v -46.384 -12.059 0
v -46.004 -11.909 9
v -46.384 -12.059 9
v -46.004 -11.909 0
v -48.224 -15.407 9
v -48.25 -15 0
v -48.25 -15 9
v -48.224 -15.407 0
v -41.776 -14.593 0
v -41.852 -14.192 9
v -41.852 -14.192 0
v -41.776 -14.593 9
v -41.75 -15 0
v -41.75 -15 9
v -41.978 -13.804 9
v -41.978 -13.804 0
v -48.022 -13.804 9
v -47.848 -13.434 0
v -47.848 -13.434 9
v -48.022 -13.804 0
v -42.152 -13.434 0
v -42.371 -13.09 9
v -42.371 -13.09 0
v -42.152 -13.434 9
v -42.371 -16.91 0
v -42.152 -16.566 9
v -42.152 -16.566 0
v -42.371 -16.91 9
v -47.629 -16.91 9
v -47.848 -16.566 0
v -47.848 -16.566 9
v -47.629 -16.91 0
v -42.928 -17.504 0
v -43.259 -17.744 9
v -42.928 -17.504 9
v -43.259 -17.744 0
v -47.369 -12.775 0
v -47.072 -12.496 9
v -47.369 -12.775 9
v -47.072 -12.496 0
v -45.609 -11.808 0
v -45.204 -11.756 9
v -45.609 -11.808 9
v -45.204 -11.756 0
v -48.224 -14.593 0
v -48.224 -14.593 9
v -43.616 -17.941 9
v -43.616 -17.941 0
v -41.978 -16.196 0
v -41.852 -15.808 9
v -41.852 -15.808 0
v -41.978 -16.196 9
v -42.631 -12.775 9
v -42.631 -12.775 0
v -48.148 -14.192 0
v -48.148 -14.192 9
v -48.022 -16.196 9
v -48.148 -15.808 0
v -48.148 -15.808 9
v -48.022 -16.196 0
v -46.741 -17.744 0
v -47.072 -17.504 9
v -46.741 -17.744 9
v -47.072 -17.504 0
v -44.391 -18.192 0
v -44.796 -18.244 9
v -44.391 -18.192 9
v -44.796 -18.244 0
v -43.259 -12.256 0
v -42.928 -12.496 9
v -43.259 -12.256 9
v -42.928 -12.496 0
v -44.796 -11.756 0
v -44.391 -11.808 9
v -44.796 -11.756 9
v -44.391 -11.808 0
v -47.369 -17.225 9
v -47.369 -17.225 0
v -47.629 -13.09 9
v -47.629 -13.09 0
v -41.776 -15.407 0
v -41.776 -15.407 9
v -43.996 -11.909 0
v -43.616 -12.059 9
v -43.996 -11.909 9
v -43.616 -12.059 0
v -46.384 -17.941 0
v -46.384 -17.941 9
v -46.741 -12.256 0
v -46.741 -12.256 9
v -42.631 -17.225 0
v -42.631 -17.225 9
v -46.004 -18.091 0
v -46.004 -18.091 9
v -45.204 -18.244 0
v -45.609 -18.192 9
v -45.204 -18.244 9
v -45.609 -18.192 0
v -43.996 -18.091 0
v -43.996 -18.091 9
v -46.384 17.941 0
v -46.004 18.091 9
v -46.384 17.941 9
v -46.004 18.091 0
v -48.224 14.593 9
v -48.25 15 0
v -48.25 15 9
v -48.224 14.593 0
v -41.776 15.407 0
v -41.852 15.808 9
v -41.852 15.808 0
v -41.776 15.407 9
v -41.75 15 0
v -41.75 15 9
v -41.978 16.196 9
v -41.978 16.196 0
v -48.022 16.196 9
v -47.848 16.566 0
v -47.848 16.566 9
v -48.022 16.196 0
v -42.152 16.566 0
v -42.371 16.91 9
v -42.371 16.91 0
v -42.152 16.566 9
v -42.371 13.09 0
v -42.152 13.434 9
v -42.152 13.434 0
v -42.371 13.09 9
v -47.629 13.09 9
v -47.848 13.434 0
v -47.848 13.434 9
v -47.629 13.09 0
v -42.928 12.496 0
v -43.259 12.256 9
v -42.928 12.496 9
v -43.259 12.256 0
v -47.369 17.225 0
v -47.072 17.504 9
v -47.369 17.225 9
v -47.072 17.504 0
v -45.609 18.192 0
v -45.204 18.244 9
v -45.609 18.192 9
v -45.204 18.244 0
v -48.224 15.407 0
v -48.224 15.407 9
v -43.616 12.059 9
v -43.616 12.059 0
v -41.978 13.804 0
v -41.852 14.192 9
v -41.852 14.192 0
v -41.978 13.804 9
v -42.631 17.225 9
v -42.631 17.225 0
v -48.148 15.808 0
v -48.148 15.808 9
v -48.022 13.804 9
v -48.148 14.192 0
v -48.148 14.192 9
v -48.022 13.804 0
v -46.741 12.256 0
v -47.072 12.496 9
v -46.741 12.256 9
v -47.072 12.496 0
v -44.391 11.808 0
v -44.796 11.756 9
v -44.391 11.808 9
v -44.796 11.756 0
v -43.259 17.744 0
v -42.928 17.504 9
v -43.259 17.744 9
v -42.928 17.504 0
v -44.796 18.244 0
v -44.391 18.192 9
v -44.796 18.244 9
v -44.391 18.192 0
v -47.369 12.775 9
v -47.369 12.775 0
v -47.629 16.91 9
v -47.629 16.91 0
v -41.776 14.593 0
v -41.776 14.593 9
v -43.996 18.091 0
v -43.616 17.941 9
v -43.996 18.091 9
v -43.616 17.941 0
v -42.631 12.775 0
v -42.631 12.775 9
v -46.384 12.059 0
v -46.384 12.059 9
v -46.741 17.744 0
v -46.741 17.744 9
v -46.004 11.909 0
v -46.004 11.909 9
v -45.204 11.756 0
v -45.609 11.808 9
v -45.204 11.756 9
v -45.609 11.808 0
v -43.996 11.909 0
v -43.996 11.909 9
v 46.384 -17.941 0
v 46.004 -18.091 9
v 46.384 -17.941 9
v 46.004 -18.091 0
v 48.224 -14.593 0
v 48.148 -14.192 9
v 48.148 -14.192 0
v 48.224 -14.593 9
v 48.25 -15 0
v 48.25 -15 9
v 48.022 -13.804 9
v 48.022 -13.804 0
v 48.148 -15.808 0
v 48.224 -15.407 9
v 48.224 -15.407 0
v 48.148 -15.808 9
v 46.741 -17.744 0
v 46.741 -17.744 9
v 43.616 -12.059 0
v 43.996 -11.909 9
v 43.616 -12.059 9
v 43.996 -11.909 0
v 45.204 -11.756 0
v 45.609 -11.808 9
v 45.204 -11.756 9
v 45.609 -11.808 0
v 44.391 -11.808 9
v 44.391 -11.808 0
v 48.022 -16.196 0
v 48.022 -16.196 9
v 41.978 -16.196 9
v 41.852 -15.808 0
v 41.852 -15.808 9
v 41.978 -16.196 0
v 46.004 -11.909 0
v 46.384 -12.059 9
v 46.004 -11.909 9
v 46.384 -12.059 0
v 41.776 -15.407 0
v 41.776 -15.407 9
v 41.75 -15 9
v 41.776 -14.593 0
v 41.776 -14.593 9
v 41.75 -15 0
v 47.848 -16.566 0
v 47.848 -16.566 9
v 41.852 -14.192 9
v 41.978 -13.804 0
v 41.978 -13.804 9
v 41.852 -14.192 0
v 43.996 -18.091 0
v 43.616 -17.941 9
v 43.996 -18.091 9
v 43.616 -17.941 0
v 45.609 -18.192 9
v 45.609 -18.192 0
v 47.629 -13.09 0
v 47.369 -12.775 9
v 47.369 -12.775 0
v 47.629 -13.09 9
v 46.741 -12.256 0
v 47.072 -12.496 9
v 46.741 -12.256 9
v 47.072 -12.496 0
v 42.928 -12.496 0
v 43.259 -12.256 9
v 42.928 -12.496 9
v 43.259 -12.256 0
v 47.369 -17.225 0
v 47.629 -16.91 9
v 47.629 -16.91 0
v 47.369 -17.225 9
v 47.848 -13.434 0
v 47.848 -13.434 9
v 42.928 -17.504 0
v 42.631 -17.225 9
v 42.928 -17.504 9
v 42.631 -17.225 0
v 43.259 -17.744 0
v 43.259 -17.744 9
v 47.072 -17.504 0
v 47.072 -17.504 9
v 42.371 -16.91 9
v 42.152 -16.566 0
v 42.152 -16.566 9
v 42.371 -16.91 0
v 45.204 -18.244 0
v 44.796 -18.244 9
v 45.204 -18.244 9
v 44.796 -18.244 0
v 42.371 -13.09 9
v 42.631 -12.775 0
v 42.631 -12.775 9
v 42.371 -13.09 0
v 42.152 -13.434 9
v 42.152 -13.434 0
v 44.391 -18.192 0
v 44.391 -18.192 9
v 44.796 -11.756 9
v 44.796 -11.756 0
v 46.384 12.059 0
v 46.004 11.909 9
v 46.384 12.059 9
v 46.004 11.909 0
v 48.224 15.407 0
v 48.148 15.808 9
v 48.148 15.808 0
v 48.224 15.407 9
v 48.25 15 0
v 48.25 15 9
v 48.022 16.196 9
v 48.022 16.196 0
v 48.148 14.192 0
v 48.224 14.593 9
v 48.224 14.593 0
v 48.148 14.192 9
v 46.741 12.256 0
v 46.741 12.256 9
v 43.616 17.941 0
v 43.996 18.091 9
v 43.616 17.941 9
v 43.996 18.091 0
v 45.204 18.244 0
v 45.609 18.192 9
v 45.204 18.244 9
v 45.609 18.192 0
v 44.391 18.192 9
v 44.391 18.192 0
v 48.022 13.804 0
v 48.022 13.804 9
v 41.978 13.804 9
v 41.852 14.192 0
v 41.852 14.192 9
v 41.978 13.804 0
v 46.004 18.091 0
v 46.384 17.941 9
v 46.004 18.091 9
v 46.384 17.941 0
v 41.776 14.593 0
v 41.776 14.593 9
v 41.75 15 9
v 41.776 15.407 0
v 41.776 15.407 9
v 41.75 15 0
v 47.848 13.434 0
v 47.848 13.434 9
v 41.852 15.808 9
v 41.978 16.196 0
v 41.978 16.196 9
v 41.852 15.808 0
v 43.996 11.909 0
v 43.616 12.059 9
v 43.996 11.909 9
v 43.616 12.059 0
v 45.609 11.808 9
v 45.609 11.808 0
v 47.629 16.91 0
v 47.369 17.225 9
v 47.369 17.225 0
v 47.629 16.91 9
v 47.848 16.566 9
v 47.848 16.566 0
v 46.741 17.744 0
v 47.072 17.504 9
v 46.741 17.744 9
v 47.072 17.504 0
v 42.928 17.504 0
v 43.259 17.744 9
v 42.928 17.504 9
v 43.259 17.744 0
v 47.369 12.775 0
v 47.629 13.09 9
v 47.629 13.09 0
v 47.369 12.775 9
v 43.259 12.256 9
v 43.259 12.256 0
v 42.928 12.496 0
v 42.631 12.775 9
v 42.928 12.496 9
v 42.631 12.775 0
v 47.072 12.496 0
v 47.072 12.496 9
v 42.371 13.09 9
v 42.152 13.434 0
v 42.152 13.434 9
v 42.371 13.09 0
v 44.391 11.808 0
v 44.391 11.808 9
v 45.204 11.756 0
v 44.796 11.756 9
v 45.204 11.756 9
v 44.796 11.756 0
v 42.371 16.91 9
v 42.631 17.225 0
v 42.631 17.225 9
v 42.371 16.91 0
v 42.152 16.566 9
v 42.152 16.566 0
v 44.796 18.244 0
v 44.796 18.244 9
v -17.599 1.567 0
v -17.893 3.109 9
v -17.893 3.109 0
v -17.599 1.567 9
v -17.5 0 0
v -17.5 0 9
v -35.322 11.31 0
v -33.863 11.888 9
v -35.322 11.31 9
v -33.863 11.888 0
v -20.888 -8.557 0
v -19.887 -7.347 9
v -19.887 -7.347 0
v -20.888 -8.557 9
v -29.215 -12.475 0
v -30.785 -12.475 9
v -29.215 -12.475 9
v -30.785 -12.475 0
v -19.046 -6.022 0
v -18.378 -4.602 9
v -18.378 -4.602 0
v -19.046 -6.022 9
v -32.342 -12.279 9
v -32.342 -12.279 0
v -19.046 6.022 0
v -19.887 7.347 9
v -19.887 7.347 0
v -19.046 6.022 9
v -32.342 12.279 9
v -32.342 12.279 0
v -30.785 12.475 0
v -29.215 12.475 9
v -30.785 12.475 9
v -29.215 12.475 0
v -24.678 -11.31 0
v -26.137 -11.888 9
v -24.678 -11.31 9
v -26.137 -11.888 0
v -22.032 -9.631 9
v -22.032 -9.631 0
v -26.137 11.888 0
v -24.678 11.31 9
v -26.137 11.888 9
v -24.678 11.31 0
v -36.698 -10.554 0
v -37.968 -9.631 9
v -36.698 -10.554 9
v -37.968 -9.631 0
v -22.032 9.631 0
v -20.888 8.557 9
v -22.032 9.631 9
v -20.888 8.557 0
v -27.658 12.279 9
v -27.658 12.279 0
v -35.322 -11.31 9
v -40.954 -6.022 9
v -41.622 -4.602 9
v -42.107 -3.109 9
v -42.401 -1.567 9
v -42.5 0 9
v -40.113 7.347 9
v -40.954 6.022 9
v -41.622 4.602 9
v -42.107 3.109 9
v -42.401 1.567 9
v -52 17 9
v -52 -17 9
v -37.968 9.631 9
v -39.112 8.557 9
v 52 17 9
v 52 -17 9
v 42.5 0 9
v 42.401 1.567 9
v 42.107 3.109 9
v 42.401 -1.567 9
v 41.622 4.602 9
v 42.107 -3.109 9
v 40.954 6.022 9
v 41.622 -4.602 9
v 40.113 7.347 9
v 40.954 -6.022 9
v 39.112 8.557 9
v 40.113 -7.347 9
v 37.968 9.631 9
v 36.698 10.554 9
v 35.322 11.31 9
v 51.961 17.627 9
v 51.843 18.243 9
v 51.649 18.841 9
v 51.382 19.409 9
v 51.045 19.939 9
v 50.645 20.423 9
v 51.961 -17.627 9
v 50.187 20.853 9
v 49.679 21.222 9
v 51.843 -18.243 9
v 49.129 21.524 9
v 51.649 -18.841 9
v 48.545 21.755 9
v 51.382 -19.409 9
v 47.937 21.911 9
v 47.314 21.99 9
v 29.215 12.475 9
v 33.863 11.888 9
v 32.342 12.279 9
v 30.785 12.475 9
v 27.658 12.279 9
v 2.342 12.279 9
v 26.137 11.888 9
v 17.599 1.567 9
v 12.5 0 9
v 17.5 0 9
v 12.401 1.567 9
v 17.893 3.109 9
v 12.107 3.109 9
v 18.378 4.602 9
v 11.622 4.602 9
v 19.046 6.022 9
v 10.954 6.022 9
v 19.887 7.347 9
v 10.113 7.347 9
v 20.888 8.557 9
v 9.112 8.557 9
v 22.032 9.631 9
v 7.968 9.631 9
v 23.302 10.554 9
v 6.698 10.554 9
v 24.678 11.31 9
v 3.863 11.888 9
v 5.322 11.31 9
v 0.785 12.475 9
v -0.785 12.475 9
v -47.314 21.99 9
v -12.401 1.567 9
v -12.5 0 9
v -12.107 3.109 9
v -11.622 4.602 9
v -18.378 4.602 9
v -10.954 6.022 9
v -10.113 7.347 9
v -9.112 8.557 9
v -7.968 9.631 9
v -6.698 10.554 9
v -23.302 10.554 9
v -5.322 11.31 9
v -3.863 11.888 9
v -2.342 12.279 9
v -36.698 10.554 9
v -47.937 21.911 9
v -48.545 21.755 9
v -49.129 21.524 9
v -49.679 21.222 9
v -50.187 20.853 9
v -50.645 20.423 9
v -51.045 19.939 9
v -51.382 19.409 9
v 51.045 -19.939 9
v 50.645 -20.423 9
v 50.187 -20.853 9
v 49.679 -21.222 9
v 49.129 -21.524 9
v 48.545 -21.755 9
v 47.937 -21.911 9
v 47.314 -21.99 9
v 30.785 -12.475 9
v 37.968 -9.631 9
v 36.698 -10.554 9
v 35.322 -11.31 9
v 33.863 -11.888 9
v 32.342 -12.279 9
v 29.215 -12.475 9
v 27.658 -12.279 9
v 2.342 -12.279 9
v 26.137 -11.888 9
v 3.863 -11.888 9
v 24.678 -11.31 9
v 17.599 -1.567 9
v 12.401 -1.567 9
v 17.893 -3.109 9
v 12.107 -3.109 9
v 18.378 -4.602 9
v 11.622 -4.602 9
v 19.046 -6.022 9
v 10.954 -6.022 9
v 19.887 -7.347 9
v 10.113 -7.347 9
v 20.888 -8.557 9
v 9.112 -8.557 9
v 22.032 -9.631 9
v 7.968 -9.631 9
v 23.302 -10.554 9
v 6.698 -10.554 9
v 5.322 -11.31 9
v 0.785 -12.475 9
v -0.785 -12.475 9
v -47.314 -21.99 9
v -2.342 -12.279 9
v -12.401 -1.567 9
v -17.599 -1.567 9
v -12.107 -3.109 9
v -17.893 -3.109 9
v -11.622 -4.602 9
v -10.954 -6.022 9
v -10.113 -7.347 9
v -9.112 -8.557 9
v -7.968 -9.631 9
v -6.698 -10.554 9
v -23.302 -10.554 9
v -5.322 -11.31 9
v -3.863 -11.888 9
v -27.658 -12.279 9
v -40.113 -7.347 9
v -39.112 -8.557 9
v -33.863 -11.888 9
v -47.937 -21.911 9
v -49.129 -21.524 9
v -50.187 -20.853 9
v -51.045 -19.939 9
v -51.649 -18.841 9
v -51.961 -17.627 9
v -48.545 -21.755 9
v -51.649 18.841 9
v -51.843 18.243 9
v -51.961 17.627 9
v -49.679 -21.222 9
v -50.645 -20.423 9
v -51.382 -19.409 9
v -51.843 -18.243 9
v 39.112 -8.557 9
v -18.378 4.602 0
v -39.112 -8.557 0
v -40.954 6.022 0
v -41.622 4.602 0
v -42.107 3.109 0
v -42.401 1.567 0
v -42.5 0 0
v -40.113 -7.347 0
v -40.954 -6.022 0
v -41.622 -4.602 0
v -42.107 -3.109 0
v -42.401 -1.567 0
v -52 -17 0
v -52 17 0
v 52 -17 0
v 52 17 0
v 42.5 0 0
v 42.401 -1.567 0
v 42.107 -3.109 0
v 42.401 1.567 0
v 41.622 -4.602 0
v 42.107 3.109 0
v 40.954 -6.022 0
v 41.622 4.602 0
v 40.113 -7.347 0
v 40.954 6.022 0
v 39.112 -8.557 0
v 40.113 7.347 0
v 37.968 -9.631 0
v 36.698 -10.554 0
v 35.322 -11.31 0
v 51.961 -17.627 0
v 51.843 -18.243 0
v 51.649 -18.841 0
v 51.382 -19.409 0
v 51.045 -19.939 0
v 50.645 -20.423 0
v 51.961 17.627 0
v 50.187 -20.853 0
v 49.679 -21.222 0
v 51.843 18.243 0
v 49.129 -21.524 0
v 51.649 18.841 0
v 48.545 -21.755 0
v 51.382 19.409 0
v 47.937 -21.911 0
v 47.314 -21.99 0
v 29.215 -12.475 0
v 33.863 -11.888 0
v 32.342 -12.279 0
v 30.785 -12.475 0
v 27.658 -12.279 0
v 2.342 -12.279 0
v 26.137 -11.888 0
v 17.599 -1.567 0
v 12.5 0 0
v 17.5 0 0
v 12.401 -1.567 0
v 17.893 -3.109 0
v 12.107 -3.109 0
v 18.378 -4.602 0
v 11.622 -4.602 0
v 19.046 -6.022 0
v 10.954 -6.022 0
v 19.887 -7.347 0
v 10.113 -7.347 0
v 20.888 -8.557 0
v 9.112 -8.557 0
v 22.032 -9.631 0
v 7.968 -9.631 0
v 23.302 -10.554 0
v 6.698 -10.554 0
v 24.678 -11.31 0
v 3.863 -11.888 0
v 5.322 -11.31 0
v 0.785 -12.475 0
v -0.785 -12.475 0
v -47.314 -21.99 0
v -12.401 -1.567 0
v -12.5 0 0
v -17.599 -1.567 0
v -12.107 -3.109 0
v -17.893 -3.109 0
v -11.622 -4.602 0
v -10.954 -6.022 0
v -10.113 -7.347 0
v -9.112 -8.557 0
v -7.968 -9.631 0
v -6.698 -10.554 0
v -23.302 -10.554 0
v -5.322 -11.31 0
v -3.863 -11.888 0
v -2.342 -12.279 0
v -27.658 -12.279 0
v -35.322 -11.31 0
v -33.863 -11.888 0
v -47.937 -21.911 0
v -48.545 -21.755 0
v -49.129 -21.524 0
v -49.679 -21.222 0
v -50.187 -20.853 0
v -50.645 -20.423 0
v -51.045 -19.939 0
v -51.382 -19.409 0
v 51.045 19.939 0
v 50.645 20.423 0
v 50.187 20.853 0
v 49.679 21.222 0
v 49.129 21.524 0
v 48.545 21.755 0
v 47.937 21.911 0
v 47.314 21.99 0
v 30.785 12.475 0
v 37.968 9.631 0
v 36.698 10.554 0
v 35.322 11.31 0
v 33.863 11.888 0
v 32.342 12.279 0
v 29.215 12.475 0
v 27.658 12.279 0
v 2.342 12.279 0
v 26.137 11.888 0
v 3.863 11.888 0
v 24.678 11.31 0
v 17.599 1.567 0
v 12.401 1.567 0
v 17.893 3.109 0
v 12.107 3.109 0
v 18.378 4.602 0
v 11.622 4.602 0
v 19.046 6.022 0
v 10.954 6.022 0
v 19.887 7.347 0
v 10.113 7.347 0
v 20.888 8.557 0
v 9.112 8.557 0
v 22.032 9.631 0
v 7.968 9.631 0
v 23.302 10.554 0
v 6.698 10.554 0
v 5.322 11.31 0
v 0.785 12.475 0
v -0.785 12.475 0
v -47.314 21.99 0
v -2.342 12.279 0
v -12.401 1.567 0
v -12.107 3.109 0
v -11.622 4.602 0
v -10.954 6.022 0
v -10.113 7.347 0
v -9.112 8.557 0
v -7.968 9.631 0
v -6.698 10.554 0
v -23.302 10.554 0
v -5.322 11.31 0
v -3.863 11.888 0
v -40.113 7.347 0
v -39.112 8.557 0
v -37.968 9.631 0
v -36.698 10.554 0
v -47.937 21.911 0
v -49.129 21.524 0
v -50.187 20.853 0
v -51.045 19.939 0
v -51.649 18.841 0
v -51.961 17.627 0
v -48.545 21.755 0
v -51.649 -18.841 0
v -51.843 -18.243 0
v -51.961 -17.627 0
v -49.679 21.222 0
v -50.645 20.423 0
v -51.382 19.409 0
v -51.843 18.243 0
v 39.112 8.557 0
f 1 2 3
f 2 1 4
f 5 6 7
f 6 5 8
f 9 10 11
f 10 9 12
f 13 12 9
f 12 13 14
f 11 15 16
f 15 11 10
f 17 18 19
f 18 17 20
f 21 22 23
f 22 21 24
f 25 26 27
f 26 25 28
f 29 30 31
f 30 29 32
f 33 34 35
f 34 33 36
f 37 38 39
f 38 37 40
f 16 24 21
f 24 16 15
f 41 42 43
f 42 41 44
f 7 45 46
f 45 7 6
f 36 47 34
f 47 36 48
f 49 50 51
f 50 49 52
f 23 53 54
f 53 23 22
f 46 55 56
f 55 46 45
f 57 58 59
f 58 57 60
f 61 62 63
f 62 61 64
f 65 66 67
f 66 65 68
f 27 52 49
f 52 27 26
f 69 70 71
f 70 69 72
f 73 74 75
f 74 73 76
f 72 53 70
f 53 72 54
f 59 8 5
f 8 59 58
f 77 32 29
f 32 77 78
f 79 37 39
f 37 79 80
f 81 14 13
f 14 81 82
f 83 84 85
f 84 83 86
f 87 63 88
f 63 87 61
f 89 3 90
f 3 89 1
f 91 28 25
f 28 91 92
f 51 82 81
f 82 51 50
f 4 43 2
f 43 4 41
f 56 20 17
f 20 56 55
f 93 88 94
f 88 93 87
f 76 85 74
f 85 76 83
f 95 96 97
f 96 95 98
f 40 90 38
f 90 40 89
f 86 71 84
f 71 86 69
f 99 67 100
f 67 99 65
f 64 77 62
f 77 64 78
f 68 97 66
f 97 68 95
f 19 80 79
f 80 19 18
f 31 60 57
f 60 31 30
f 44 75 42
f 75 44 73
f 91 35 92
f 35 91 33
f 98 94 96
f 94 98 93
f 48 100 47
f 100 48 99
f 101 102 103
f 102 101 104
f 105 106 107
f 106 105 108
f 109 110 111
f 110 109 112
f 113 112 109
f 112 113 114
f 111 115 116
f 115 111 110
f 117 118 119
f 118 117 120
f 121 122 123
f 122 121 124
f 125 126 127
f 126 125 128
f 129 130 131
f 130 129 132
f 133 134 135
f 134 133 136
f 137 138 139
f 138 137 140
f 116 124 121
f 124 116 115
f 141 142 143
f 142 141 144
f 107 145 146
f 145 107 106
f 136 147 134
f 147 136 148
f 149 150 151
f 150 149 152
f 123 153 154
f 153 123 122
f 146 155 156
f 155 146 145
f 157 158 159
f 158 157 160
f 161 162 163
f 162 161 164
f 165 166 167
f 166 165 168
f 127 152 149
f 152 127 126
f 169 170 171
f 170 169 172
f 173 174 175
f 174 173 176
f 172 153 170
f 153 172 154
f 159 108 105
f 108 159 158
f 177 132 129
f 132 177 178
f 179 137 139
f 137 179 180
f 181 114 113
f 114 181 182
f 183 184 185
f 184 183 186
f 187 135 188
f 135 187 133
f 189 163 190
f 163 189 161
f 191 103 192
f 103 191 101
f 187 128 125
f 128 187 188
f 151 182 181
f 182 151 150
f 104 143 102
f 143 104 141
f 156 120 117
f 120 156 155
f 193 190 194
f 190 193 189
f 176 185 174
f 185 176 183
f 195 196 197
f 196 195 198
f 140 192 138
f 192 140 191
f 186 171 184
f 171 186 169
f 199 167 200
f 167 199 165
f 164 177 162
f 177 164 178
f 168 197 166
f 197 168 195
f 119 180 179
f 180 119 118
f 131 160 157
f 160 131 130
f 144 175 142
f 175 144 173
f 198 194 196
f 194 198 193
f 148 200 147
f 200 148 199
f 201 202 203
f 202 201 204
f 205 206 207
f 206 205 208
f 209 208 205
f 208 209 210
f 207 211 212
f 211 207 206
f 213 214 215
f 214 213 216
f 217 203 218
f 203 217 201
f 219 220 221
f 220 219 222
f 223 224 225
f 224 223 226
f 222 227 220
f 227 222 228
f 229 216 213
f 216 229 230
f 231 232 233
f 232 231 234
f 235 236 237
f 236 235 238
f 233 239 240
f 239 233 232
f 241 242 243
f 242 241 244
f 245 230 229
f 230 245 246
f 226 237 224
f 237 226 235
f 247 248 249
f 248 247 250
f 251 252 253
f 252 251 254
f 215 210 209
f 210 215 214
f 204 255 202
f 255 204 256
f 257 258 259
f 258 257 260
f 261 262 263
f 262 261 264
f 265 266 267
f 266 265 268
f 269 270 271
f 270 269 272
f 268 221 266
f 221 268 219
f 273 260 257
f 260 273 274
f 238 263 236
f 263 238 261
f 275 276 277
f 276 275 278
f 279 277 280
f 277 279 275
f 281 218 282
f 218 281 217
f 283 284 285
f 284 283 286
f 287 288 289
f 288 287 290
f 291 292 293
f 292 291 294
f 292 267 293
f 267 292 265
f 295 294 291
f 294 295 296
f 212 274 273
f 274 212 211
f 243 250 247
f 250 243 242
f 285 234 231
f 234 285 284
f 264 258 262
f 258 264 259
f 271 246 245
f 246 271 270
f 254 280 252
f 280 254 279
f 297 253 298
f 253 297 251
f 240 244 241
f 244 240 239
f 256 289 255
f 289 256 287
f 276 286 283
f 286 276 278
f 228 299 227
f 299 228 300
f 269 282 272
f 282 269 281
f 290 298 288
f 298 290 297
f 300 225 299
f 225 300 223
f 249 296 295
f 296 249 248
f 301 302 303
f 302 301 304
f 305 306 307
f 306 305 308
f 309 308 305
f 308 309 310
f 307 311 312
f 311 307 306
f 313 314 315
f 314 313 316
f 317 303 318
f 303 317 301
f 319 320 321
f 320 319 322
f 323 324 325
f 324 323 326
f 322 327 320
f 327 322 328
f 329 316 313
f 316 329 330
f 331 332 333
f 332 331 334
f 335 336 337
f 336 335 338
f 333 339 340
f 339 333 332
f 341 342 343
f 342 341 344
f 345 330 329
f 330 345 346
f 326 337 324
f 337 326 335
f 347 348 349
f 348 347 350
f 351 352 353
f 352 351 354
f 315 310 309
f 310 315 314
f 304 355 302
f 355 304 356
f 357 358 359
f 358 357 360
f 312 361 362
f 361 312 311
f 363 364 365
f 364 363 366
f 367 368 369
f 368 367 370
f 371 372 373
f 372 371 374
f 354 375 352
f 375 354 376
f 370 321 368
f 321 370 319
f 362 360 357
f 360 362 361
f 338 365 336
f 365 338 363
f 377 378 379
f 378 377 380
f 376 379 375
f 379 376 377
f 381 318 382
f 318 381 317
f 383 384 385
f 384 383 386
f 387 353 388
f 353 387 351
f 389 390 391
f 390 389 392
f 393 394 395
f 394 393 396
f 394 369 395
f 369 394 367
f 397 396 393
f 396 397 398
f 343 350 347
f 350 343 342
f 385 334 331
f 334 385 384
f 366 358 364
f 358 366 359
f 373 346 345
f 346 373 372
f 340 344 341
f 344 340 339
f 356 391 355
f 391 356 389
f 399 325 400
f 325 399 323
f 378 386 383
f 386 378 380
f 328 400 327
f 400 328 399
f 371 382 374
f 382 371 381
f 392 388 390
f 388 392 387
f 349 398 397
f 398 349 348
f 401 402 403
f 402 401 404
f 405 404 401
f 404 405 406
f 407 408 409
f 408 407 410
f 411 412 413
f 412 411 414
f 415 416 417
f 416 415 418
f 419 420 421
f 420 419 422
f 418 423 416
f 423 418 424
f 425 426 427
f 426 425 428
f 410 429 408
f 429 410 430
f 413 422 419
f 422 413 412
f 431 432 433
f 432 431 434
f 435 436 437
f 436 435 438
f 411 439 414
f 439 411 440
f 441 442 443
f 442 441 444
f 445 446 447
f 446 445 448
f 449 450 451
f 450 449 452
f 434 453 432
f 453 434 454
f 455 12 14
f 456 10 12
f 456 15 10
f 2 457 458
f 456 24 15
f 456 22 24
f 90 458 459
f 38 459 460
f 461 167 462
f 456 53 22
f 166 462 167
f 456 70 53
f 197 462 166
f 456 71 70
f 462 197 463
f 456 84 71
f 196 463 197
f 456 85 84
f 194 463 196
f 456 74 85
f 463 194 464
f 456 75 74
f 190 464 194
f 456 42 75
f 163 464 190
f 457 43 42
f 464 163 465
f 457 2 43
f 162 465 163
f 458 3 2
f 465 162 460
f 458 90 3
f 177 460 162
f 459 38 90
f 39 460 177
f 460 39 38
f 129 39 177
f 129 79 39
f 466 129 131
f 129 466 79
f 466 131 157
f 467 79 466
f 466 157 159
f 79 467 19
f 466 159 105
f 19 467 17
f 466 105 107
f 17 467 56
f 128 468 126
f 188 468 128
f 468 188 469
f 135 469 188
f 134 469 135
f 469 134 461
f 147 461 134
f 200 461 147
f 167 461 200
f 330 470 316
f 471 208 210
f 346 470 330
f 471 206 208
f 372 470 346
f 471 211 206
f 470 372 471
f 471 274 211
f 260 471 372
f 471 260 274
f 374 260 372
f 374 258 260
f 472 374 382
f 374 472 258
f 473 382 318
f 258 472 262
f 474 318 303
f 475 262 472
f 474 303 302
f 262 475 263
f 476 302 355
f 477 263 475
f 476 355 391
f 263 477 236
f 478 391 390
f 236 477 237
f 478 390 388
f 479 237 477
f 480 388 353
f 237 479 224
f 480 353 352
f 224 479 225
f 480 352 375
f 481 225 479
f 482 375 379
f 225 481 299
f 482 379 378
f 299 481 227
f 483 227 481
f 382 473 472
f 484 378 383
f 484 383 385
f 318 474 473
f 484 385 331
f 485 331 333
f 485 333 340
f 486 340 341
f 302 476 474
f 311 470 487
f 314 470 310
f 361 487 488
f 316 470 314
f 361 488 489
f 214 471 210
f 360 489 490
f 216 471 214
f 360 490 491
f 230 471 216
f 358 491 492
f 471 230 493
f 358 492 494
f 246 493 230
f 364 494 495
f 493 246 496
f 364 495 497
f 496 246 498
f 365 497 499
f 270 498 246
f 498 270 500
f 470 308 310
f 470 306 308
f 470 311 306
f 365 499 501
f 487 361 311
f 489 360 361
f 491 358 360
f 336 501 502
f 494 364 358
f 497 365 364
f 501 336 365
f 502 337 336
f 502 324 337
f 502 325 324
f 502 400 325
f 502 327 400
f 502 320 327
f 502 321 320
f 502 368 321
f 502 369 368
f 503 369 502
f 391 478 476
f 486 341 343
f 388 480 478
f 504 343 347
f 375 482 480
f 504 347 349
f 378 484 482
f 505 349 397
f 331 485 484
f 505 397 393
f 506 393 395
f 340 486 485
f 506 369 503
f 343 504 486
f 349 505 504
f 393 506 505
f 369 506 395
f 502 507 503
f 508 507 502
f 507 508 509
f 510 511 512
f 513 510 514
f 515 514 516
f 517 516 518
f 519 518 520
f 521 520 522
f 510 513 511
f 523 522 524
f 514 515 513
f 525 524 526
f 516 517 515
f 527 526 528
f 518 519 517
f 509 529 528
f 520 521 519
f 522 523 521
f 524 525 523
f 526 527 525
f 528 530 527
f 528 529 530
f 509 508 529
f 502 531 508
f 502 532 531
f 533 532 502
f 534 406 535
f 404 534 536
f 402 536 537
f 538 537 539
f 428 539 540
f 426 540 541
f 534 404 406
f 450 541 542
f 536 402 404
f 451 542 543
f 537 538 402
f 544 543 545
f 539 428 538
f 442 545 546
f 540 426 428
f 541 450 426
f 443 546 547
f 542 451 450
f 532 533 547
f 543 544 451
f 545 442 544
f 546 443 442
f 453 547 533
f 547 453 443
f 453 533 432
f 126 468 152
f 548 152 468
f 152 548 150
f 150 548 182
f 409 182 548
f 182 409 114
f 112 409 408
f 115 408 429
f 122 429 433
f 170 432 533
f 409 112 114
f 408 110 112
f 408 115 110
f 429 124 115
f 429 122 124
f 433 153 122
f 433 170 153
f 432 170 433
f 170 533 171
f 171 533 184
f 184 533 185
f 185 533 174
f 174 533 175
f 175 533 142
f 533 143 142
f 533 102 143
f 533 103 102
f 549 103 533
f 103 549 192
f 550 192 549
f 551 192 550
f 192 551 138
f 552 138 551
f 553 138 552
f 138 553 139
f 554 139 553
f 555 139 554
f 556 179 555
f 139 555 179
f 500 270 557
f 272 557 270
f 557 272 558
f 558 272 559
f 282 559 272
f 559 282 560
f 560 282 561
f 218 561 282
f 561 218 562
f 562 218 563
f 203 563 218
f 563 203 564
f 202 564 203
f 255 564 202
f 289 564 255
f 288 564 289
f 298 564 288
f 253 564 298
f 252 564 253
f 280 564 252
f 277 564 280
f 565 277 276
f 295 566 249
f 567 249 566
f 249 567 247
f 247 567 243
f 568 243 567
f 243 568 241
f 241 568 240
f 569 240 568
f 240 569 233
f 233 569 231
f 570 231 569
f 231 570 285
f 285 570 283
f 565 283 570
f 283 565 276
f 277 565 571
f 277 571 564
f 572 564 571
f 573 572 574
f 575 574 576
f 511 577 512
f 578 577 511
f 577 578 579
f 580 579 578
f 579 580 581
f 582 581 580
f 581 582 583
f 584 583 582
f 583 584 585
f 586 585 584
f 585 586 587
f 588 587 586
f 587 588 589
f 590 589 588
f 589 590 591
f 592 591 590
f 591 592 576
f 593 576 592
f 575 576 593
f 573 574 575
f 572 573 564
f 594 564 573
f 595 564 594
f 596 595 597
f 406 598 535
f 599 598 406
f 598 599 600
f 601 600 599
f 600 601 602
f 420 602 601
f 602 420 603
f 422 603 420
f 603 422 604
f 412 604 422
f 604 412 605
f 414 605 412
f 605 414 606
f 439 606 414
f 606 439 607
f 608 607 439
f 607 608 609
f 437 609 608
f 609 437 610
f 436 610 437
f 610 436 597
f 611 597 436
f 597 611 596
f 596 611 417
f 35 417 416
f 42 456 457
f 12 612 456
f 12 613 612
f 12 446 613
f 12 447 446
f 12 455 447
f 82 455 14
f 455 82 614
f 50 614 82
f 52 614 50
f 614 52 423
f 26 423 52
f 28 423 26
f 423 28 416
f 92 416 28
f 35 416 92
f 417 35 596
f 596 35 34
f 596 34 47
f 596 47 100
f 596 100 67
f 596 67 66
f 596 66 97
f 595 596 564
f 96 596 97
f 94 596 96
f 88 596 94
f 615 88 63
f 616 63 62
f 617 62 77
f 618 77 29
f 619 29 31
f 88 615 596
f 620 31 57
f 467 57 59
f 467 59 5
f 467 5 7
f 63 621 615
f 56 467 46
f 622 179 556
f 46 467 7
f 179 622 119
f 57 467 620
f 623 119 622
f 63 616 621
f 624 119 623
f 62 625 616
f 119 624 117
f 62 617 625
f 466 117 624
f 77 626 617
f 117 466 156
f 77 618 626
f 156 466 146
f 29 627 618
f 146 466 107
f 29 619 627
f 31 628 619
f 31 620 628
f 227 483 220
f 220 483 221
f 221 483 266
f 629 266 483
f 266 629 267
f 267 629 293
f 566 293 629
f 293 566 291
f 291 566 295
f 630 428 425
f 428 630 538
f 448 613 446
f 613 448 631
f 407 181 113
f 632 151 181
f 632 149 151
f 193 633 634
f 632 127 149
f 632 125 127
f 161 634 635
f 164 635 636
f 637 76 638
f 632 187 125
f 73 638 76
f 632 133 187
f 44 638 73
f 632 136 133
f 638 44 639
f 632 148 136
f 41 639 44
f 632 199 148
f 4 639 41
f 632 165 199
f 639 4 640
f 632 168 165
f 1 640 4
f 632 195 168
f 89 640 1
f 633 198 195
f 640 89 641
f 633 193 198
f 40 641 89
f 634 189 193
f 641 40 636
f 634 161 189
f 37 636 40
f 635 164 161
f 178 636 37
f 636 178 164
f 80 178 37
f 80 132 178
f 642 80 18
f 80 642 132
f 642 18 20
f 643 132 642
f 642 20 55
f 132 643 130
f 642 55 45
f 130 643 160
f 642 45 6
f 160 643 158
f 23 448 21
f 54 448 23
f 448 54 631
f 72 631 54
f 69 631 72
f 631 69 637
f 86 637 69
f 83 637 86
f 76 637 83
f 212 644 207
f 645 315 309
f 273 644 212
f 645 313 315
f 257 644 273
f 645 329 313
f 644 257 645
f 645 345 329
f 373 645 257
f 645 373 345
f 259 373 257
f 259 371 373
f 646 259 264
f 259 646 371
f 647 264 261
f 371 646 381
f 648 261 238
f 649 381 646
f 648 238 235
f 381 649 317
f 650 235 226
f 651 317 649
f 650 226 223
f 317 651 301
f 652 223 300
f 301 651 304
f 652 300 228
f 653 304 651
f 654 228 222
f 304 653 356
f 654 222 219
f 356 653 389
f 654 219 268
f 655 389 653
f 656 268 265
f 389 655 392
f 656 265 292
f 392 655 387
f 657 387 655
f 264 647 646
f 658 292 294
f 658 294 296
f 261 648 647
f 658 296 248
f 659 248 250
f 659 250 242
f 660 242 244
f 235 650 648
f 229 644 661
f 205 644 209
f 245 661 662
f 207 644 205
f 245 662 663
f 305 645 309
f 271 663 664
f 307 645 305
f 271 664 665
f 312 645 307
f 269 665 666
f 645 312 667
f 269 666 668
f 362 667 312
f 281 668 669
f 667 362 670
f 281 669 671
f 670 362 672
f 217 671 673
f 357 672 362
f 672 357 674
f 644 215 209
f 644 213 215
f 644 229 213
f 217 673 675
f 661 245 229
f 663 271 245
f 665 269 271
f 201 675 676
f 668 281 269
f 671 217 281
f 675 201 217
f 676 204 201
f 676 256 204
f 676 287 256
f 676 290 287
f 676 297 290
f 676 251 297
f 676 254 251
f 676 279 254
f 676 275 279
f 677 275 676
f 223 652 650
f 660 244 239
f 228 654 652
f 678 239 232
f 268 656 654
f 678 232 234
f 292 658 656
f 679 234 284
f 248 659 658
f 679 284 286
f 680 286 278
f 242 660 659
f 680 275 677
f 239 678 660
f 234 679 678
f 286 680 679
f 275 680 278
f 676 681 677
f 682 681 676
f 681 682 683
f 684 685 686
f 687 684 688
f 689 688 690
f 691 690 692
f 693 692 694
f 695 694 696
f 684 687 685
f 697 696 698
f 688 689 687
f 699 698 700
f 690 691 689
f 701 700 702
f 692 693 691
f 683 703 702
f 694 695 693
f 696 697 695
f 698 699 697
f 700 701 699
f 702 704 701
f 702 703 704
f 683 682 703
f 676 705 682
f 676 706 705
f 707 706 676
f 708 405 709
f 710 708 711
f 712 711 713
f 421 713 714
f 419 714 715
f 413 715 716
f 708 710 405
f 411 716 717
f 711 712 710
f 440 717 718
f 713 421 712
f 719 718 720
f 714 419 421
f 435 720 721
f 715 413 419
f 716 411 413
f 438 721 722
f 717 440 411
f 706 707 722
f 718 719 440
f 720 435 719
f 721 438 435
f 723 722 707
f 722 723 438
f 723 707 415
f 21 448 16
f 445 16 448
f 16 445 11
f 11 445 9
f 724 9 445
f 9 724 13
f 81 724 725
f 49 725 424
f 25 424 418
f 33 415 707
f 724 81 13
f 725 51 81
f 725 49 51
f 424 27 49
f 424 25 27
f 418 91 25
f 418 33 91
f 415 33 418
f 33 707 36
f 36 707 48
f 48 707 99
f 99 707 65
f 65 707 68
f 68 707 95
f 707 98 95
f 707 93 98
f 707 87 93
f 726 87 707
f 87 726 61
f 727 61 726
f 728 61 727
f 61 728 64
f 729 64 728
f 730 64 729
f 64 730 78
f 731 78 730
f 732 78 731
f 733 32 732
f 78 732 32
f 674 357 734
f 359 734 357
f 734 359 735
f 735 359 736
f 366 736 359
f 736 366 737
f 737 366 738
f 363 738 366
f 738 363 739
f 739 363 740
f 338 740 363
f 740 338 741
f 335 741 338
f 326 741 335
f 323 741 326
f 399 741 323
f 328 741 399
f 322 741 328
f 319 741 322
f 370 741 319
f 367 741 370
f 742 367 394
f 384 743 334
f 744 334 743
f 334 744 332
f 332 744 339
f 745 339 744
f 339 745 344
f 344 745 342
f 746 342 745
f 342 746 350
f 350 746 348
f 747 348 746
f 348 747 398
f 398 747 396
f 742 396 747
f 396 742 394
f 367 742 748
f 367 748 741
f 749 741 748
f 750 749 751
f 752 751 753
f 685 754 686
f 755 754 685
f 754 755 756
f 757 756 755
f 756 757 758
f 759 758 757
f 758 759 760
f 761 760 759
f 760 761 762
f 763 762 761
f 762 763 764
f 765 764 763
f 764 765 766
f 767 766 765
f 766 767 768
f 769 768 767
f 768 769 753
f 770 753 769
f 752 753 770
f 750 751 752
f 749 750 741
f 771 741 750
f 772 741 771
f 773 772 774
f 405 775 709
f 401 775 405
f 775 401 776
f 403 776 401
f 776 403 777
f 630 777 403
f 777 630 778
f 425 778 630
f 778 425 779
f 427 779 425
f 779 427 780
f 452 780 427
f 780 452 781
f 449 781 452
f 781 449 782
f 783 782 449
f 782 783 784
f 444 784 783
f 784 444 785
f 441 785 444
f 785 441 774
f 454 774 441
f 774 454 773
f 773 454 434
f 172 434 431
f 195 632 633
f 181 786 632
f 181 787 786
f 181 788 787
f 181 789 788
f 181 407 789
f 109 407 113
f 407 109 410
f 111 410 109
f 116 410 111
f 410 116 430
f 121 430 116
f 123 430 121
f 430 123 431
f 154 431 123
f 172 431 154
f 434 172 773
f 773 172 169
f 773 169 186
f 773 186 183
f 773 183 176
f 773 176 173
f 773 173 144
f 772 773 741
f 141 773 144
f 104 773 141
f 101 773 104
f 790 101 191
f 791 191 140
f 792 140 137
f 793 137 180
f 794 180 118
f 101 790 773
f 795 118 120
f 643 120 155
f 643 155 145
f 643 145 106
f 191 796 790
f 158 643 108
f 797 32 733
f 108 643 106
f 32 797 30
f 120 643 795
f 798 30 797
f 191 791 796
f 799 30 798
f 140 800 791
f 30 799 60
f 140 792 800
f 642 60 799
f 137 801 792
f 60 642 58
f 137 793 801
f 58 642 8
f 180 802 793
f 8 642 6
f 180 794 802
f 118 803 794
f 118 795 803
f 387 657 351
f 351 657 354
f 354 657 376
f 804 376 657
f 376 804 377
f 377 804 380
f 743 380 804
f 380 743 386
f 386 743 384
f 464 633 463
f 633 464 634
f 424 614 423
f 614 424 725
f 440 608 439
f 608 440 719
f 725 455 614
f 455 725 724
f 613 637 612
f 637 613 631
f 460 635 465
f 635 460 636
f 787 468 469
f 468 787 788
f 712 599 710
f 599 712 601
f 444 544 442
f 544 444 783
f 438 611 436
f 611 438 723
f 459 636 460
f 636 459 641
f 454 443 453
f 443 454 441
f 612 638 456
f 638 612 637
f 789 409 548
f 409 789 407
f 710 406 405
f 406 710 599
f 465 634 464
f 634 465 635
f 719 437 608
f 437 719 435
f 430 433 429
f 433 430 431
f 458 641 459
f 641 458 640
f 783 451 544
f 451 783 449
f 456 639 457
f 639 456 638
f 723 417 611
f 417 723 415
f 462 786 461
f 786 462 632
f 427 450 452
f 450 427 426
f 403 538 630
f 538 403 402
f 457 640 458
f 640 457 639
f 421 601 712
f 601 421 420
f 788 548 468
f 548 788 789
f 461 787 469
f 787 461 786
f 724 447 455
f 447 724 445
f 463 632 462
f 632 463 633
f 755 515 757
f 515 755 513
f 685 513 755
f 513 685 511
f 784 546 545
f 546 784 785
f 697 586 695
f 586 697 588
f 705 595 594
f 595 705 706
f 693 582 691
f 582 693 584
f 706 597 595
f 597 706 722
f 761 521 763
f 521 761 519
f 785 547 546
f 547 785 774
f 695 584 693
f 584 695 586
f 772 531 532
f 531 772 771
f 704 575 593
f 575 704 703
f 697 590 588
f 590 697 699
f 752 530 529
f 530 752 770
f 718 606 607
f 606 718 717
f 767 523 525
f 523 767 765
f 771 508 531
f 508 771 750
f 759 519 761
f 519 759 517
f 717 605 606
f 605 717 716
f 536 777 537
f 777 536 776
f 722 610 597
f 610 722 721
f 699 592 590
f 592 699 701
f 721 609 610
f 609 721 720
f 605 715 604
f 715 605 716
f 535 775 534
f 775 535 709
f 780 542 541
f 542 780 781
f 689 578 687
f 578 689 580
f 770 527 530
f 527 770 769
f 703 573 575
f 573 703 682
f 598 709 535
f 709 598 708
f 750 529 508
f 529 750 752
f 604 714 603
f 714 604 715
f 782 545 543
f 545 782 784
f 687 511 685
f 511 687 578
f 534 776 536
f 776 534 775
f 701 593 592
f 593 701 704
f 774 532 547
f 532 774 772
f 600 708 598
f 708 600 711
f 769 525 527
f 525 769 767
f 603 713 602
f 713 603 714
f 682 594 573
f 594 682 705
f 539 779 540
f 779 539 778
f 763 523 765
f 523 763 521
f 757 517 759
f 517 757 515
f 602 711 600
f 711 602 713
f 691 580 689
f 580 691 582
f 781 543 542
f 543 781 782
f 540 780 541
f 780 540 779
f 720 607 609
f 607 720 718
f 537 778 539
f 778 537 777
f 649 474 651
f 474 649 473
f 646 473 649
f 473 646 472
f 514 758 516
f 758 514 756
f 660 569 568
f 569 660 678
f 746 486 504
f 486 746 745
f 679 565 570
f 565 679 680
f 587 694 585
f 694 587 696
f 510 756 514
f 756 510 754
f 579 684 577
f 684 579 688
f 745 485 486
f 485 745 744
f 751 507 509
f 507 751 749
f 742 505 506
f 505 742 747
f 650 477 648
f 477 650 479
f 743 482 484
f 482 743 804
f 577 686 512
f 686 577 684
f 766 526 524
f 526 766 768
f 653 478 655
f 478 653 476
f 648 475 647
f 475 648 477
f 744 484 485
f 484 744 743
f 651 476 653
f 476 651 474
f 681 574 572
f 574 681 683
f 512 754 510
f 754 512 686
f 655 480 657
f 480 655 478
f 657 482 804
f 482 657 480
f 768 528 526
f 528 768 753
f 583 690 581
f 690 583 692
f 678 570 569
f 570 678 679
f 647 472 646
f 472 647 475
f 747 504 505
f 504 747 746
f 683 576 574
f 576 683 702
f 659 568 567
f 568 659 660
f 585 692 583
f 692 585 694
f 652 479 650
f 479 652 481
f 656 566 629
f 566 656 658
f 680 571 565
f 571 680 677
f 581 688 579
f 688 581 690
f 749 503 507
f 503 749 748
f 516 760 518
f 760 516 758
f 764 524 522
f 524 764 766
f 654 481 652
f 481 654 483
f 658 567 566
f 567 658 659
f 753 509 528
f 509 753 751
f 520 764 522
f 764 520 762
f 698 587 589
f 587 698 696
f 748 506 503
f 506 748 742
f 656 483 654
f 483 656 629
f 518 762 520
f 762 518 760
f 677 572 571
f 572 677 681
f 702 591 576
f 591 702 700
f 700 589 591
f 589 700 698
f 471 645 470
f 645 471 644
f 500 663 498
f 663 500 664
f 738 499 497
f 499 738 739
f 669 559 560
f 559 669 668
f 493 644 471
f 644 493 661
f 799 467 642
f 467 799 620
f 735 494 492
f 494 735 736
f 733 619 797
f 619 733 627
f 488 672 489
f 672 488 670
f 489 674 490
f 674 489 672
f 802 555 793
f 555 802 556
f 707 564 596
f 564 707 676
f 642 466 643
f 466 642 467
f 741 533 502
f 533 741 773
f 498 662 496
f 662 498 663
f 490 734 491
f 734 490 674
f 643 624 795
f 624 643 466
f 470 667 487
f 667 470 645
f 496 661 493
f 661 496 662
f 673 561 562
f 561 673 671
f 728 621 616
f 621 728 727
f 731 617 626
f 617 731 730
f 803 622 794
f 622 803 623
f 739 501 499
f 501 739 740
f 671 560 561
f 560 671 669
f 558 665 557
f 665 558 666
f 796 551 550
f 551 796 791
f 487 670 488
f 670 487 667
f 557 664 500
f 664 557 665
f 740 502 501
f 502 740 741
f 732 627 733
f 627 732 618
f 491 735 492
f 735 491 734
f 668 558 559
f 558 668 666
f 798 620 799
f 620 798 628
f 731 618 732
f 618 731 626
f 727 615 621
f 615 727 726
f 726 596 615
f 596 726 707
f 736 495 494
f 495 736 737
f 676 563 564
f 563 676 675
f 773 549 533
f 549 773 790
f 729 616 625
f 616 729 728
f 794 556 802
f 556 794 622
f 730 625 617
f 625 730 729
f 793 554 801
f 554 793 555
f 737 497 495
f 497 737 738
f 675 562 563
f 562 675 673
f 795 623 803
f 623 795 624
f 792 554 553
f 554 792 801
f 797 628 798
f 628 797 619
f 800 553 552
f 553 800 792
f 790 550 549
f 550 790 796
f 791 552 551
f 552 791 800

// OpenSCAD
$fn = 50;


difference() {
	union() {
		hull() {
			translate(v = [-47.0000000000, 17.0000000000, 0]) {
				cylinder(h = 9, r = 5);
			}
			translate(v = [47.0000000000, 17.0000000000, 0]) {
				cylinder(h = 9, r = 5);
			}
			translate(v = [-47.0000000000, -17.0000000000, 0]) {
				cylinder(h = 9, r = 5);
			}
			translate(v = [47.0000000000, -17.0000000000, 0]) {
				cylinder(h = 9, r = 5);
			}
		}
	}
	union() {
		#translate(v = [-45.0000000000, -15.0000000000, -100.0000000000]) {
			cylinder(h = 200, r = 3.2500000000);
		}
		#translate(v = [-45.0000000000, 15.0000000000, -100.0000000000]) {
			cylinder(h = 200, r = 3.2500000000);
		}
		#translate(v = [45.0000000000, -15.0000000000, -100.0000000000]) {
			cylinder(h = 200, r = 3.2500000000);
		}
		#translate(v = [45.0000000000, 15.0000000000, -100.0000000000]) {
			cylinder(h = 200, r = 3.2500000000);
		}
		#translate(v = [-30.0000000000, 0, 0]) {
			cylinder(h = 9, r = 12.5000000000);
		}
		#cylinder(h = 9, r = 12.5000000000);
		#translate(v = [30.0000000000, 0, 0]) {
			cylinder(h = 9, r = 12.5000000000);
		}
	}
}
